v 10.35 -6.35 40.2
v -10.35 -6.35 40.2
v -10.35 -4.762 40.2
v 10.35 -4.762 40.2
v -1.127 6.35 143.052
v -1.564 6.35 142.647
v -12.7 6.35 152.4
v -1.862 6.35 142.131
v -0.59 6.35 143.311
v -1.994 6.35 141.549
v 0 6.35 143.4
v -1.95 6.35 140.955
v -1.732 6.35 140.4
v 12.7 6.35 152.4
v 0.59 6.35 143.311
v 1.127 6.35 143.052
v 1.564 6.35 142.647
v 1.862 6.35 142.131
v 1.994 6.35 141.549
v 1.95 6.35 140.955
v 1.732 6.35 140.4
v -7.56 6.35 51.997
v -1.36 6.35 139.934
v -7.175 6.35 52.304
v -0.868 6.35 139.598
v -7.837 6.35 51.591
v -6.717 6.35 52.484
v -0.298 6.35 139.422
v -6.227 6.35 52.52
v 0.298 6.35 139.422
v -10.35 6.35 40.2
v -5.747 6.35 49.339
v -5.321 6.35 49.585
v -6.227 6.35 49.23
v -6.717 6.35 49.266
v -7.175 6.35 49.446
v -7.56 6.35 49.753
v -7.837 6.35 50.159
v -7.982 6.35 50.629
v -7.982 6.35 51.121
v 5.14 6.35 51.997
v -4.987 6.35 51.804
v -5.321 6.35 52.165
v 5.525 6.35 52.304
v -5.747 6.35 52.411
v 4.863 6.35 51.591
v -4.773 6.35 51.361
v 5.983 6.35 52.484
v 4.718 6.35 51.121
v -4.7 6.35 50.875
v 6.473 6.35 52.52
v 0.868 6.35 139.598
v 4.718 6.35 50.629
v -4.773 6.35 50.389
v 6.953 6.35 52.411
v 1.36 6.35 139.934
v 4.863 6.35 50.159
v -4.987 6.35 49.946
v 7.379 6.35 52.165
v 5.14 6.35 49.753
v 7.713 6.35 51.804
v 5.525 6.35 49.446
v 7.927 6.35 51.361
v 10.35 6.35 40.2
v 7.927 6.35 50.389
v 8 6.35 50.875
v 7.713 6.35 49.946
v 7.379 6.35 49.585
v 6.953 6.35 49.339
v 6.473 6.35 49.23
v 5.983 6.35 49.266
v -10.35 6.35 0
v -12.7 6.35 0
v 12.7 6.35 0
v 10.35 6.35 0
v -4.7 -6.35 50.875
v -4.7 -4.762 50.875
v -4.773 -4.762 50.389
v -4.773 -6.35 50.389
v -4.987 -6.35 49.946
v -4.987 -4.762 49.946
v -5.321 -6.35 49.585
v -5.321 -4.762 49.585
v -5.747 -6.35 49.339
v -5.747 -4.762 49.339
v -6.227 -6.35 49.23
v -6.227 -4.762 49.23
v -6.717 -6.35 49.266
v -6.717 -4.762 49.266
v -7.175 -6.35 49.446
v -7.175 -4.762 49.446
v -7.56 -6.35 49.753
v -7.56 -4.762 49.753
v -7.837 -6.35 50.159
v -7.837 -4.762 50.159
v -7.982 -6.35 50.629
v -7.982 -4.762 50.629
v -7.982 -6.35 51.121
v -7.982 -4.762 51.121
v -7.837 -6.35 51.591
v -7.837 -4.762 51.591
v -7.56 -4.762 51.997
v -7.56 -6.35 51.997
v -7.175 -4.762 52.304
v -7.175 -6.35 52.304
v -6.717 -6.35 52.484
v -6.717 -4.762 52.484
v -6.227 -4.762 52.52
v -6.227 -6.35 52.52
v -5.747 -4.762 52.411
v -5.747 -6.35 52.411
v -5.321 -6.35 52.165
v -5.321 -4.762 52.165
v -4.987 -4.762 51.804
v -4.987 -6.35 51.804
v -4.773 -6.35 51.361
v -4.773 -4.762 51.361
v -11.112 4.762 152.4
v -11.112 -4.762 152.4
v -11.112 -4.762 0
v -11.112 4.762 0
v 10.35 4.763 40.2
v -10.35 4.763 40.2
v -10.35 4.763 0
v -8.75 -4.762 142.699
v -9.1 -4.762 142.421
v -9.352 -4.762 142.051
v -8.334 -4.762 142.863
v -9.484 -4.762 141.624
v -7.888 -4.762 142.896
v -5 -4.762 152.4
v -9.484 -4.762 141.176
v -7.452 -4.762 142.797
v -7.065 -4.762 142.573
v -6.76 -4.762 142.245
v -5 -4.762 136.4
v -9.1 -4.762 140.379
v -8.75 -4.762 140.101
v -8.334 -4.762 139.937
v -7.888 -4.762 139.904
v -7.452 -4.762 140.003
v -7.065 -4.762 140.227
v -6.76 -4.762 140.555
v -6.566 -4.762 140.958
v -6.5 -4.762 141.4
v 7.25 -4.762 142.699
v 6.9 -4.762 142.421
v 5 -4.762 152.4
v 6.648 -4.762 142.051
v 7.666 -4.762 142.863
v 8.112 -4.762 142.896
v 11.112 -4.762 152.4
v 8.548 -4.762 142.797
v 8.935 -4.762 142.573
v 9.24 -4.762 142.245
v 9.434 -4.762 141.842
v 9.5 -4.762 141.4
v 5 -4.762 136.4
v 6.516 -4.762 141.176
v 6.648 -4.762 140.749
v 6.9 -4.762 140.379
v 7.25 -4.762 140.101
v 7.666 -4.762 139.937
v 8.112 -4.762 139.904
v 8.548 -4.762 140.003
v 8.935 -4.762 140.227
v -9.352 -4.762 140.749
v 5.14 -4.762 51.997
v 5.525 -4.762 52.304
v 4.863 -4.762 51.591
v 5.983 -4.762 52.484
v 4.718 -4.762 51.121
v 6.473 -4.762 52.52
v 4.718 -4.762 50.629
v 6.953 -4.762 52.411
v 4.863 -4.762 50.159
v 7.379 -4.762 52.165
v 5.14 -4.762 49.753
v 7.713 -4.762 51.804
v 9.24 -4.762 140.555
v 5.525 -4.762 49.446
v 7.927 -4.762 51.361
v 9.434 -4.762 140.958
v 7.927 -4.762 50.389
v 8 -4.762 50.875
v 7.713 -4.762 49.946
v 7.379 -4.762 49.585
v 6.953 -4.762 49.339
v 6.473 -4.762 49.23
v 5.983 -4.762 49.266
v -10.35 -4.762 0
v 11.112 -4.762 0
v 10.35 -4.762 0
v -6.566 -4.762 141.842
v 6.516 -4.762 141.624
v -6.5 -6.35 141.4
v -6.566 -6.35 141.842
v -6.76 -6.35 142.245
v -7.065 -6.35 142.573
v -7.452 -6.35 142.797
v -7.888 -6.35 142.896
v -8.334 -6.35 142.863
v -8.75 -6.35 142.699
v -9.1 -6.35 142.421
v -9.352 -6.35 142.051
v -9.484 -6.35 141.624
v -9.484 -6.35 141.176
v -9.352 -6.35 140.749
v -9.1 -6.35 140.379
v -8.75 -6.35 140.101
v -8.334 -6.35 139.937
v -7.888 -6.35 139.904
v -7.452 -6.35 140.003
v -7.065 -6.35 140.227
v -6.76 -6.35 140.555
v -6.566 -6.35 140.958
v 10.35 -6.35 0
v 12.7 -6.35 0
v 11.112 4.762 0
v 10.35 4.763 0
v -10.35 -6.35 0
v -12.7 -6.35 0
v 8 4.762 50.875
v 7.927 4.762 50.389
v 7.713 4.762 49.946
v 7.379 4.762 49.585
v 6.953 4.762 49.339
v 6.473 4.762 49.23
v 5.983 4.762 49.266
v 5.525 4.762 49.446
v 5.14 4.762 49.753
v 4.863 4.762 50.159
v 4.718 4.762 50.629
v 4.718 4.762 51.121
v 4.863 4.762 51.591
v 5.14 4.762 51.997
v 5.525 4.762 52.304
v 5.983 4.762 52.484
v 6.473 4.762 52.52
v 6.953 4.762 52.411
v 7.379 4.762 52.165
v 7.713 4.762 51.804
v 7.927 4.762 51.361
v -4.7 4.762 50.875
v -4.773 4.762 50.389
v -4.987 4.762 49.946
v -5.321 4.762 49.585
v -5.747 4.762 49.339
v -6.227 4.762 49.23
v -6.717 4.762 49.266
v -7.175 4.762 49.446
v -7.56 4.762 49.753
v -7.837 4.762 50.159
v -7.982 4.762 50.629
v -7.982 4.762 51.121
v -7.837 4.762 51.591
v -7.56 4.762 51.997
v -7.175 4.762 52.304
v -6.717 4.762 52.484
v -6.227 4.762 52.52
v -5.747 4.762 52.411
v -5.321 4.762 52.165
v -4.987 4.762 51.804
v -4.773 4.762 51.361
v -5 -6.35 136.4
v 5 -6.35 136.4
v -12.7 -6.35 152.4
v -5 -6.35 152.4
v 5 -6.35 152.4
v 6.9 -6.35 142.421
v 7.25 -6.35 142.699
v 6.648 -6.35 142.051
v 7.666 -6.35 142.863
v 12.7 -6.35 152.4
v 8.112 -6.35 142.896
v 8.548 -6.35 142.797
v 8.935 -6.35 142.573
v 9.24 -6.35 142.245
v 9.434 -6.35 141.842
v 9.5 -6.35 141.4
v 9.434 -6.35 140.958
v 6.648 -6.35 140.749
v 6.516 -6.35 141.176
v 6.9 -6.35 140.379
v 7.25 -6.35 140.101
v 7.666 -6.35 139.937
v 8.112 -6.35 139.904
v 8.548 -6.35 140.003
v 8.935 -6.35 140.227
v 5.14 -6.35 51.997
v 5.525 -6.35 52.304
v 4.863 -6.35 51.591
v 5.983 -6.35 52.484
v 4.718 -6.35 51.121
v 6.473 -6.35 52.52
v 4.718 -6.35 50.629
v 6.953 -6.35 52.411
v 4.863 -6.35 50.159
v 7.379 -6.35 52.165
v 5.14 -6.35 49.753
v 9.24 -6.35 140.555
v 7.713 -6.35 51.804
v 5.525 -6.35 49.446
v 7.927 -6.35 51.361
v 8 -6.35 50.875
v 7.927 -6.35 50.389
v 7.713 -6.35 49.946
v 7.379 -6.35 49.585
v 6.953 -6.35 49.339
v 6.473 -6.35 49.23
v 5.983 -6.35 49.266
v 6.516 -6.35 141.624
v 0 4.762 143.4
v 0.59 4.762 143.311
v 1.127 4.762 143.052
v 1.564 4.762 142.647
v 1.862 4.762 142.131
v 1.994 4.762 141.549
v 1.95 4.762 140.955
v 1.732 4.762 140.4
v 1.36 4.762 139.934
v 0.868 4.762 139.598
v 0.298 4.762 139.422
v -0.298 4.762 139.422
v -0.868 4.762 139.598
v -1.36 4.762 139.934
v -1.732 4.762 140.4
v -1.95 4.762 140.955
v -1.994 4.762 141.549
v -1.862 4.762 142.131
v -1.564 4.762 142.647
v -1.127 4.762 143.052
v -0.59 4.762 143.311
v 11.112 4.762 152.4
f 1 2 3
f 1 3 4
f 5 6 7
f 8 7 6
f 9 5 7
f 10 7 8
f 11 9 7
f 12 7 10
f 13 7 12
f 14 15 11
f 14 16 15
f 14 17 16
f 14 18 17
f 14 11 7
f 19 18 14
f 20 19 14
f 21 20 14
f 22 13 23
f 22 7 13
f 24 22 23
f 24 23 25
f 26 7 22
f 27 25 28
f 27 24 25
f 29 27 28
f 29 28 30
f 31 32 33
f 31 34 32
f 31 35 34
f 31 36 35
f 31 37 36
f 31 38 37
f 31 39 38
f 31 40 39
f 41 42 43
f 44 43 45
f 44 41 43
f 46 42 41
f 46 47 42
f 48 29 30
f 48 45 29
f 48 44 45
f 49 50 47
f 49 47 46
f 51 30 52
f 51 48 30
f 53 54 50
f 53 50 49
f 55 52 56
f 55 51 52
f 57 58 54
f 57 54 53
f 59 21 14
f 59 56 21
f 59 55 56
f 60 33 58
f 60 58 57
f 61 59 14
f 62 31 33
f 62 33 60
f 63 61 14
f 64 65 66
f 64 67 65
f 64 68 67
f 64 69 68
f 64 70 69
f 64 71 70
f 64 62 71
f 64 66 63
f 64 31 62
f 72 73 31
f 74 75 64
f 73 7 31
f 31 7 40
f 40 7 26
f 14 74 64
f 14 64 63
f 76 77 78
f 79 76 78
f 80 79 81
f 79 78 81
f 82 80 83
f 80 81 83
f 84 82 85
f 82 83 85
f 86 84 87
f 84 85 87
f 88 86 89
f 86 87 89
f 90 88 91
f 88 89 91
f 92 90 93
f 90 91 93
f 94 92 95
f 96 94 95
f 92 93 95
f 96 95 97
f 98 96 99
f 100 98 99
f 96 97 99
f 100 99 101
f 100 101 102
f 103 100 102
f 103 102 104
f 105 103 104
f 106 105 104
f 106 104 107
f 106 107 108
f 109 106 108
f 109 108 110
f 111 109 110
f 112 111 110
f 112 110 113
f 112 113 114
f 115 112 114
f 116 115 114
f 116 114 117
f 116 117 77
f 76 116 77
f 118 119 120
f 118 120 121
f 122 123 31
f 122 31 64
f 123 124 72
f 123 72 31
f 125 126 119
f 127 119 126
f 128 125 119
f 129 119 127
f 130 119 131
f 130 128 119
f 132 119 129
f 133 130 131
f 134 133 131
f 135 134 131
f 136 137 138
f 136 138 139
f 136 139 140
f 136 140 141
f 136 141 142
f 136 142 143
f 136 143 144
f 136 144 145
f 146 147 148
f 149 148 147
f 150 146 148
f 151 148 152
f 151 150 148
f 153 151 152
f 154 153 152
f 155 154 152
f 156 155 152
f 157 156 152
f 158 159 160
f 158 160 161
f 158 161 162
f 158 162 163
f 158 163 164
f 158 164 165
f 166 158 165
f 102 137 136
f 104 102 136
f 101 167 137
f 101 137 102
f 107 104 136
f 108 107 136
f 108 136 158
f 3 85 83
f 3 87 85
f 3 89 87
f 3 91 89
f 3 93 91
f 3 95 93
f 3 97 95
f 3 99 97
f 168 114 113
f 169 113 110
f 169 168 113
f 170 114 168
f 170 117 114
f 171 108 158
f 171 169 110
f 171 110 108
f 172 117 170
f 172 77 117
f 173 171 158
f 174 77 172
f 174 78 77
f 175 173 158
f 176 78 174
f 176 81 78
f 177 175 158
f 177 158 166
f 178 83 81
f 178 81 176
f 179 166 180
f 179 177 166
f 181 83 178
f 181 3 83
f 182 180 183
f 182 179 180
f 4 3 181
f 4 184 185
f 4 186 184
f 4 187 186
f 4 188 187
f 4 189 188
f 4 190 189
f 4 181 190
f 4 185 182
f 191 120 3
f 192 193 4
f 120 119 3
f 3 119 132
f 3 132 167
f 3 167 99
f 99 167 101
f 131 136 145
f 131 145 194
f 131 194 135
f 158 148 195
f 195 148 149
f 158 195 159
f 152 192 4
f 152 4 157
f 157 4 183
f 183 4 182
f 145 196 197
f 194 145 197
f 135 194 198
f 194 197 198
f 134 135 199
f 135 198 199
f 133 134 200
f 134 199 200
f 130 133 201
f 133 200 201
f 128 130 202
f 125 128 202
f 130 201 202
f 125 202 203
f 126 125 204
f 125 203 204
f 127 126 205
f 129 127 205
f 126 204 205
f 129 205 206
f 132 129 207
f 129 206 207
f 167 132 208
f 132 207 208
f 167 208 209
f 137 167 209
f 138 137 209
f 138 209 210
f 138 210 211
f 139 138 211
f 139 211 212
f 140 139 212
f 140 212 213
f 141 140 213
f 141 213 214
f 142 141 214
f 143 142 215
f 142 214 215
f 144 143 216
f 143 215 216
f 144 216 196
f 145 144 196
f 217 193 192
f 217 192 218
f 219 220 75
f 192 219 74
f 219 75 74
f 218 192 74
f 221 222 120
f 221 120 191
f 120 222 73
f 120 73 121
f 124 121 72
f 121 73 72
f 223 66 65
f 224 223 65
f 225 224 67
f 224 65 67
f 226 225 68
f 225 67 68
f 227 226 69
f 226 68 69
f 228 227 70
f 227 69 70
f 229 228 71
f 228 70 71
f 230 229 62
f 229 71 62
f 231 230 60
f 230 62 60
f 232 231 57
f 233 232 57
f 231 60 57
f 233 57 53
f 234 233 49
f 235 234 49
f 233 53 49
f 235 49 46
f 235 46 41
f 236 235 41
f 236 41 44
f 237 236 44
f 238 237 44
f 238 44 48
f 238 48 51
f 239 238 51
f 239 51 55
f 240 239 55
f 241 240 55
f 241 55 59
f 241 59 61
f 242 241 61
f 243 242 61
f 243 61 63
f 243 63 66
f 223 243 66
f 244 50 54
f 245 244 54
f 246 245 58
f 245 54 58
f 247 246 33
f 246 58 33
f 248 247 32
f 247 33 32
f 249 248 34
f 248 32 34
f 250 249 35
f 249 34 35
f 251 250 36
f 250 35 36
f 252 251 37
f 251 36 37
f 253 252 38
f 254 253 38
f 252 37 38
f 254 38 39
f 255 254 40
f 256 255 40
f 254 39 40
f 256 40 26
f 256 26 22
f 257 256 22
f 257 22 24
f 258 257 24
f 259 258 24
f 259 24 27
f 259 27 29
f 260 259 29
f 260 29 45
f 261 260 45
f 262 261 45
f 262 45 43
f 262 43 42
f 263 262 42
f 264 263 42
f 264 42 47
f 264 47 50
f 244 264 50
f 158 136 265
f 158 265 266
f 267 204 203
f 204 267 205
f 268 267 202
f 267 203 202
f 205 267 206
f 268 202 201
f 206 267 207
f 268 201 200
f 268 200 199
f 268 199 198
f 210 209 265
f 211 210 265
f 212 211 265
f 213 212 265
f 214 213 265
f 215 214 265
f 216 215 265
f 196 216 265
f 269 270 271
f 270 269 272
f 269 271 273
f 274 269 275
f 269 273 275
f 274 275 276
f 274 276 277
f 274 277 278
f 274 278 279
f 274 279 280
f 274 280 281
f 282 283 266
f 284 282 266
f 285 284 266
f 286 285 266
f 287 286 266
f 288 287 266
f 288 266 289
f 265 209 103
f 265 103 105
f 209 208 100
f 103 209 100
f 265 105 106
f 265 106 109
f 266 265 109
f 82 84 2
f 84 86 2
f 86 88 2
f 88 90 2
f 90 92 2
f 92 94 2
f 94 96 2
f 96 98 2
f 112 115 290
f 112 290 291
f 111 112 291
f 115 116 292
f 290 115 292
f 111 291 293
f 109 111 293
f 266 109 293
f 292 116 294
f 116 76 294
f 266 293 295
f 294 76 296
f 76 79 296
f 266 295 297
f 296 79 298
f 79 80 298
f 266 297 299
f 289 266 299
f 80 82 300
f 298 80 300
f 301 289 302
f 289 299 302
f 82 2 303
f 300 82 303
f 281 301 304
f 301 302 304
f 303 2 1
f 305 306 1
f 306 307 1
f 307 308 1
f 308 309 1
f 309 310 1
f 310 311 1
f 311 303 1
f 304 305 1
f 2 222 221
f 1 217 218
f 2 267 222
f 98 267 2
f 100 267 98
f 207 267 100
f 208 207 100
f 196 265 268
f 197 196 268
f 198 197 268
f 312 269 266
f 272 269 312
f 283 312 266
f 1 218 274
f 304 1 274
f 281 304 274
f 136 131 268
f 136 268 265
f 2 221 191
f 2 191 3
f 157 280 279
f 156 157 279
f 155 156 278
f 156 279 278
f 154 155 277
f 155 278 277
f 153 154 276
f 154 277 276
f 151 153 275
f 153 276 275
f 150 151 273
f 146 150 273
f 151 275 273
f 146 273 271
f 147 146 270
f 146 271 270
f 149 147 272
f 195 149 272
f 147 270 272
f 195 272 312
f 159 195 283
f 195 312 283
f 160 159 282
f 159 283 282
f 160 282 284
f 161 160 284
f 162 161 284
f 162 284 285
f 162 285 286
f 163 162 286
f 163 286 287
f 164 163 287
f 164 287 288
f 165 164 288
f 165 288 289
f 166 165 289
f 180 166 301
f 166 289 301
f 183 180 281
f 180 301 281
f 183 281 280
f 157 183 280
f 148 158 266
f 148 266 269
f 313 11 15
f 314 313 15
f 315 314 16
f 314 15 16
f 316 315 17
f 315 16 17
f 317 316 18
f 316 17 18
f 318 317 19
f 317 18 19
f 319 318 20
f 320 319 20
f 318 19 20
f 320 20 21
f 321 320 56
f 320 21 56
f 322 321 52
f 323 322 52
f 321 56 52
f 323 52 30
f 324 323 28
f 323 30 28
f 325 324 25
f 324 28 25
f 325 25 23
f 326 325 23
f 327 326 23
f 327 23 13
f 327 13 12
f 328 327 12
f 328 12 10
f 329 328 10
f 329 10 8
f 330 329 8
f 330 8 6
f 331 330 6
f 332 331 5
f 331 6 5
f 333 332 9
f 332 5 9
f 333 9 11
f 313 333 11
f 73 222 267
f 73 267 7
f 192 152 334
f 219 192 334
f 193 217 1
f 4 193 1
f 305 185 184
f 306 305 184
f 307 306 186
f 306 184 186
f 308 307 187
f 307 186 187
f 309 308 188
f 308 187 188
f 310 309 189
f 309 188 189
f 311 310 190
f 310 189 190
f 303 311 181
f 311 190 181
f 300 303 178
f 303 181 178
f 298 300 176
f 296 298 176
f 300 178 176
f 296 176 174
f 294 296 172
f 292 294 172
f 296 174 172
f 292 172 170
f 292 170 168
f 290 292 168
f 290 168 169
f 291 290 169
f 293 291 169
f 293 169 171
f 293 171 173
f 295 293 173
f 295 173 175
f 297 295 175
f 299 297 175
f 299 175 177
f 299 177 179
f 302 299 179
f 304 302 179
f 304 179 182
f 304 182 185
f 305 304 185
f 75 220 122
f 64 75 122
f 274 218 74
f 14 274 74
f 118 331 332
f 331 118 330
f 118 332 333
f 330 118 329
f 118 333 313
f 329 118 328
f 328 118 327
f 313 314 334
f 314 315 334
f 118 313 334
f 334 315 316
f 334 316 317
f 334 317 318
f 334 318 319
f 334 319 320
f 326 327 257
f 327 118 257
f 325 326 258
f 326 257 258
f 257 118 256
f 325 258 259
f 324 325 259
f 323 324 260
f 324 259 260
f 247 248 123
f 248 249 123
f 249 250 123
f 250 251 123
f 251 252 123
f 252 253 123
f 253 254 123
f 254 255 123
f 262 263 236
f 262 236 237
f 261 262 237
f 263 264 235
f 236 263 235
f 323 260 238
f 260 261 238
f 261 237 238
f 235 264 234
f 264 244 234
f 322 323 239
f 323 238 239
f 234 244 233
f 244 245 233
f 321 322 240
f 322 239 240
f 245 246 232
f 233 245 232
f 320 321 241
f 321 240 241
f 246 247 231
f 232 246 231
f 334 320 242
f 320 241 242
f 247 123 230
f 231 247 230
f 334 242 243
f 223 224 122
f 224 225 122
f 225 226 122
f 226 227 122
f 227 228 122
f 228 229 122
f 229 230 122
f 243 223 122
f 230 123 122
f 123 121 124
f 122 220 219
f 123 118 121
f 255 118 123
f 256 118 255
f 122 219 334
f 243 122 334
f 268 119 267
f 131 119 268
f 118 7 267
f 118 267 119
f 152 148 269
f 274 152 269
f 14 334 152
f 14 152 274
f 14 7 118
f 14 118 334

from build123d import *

# Parameters (mm, degrees)
SKETCH3_W               = 25.4
SKETCH3_H               = 12.7
SKETCH3_W_2             = 22.225
SKETCH3_H_2             = 9.525
BOSS_EXTRUDE1_DEPTH     = 152.4
SKETCH4_R               = 2
CUT_EXTRUDE1_DEPTH      = 1.5875
SKETCH5_R               = 1.500419334
CUT_EXTRUDE2_DEPTH      = 1.5875
CUT_EXTRUDE3_DEPTH      = 154.454683865
CUT_EXTRUDE3_DEPTH_BACK = 2.54
SKETCH7_W               = 20.700000002
SKETCH7_H               = 40.2
CUT_EXTRUDE4_DEPTH      = 154.454683865
M4X0_7_TAPPED_HOLE1_D   = 3.3


with BuildPart() as part:
    # Sketch3 → Boss-Extrude1 (new body)
    with BuildSketch(Plane.XY):
        Rectangle(SKETCH3_W, SKETCH3_H)
        Rectangle(SKETCH3_W_2, SKETCH3_H_2, mode=Mode.SUBTRACT)
    extrude(amount=BOSS_EXTRUDE1_DEPTH)

    # Sketch4 → Cut-Extrude1 (cut)
    with BuildSketch(Plane(origin=(0, 6.35, 0), x_dir=(1, 0, 0), z_dir=(0, 1, 0))):
        with Locations(Location((0, -141.4, 0), (0, 0, 270))):
            Circle(SKETCH4_R)
    extrude(amount=-CUT_EXTRUDE1_DEPTH, mode=Mode.SUBTRACT)

    # Sketch5 → Cut-Extrude2 (cut)
    with BuildSketch(Plane.XZ.offset(6.35)):
        with Locations((-8, 141.4)):
            Circle(SKETCH5_R)
        with Locations((0, 149.4)):
            Circle(SKETCH5_R)
        with Locations((8, 141.4)):
            Circle(SKETCH5_R)
    extrude(amount=-CUT_EXTRUDE2_DEPTH, mode=Mode.SUBTRACT)

    # Sketch6 → Cut-Extrude3 (cut, two sides: drawn at the far end of the back side and taken through both)
    with BuildSketch(Plane.XZ.offset(6.35).offset(-CUT_EXTRUDE3_DEPTH_BACK)):
        Polygon((-5, 469.248822712), (-5, 152.4), (-5, 136.4), (5, 136.4), (5, 152.4), (5, 469.248822712), (5, 1102.946468137), (-5, 1102.946468137), align=None)
    extrude(amount=CUT_EXTRUDE3_DEPTH + CUT_EXTRUDE3_DEPTH_BACK, mode=Mode.SUBTRACT)

    # Sketch7 → Cut-Extrude4 (cut, through all)
    with BuildSketch(Plane.XZ.offset(6.35)):
        with Locations((0, 20.1)):
            Rectangle(SKETCH7_W, SKETCH7_H)
    extrude(amount=-CUT_EXTRUDE4_DEPTH, mode=Mode.SUBTRACT)

    # M4x0.7 Tapped Hole1 (through all)
    with Locations(Plane(origin=(0, -6.35, 0), x_dir=(-1, 0, 0), z_dir=(0, -1, 0))):
        with Locations((-6.35, -50.875), (6.35, -50.875)):
            Hole(M4X0_7_TAPPED_HOLE1_D / 2)


solid = part.part
